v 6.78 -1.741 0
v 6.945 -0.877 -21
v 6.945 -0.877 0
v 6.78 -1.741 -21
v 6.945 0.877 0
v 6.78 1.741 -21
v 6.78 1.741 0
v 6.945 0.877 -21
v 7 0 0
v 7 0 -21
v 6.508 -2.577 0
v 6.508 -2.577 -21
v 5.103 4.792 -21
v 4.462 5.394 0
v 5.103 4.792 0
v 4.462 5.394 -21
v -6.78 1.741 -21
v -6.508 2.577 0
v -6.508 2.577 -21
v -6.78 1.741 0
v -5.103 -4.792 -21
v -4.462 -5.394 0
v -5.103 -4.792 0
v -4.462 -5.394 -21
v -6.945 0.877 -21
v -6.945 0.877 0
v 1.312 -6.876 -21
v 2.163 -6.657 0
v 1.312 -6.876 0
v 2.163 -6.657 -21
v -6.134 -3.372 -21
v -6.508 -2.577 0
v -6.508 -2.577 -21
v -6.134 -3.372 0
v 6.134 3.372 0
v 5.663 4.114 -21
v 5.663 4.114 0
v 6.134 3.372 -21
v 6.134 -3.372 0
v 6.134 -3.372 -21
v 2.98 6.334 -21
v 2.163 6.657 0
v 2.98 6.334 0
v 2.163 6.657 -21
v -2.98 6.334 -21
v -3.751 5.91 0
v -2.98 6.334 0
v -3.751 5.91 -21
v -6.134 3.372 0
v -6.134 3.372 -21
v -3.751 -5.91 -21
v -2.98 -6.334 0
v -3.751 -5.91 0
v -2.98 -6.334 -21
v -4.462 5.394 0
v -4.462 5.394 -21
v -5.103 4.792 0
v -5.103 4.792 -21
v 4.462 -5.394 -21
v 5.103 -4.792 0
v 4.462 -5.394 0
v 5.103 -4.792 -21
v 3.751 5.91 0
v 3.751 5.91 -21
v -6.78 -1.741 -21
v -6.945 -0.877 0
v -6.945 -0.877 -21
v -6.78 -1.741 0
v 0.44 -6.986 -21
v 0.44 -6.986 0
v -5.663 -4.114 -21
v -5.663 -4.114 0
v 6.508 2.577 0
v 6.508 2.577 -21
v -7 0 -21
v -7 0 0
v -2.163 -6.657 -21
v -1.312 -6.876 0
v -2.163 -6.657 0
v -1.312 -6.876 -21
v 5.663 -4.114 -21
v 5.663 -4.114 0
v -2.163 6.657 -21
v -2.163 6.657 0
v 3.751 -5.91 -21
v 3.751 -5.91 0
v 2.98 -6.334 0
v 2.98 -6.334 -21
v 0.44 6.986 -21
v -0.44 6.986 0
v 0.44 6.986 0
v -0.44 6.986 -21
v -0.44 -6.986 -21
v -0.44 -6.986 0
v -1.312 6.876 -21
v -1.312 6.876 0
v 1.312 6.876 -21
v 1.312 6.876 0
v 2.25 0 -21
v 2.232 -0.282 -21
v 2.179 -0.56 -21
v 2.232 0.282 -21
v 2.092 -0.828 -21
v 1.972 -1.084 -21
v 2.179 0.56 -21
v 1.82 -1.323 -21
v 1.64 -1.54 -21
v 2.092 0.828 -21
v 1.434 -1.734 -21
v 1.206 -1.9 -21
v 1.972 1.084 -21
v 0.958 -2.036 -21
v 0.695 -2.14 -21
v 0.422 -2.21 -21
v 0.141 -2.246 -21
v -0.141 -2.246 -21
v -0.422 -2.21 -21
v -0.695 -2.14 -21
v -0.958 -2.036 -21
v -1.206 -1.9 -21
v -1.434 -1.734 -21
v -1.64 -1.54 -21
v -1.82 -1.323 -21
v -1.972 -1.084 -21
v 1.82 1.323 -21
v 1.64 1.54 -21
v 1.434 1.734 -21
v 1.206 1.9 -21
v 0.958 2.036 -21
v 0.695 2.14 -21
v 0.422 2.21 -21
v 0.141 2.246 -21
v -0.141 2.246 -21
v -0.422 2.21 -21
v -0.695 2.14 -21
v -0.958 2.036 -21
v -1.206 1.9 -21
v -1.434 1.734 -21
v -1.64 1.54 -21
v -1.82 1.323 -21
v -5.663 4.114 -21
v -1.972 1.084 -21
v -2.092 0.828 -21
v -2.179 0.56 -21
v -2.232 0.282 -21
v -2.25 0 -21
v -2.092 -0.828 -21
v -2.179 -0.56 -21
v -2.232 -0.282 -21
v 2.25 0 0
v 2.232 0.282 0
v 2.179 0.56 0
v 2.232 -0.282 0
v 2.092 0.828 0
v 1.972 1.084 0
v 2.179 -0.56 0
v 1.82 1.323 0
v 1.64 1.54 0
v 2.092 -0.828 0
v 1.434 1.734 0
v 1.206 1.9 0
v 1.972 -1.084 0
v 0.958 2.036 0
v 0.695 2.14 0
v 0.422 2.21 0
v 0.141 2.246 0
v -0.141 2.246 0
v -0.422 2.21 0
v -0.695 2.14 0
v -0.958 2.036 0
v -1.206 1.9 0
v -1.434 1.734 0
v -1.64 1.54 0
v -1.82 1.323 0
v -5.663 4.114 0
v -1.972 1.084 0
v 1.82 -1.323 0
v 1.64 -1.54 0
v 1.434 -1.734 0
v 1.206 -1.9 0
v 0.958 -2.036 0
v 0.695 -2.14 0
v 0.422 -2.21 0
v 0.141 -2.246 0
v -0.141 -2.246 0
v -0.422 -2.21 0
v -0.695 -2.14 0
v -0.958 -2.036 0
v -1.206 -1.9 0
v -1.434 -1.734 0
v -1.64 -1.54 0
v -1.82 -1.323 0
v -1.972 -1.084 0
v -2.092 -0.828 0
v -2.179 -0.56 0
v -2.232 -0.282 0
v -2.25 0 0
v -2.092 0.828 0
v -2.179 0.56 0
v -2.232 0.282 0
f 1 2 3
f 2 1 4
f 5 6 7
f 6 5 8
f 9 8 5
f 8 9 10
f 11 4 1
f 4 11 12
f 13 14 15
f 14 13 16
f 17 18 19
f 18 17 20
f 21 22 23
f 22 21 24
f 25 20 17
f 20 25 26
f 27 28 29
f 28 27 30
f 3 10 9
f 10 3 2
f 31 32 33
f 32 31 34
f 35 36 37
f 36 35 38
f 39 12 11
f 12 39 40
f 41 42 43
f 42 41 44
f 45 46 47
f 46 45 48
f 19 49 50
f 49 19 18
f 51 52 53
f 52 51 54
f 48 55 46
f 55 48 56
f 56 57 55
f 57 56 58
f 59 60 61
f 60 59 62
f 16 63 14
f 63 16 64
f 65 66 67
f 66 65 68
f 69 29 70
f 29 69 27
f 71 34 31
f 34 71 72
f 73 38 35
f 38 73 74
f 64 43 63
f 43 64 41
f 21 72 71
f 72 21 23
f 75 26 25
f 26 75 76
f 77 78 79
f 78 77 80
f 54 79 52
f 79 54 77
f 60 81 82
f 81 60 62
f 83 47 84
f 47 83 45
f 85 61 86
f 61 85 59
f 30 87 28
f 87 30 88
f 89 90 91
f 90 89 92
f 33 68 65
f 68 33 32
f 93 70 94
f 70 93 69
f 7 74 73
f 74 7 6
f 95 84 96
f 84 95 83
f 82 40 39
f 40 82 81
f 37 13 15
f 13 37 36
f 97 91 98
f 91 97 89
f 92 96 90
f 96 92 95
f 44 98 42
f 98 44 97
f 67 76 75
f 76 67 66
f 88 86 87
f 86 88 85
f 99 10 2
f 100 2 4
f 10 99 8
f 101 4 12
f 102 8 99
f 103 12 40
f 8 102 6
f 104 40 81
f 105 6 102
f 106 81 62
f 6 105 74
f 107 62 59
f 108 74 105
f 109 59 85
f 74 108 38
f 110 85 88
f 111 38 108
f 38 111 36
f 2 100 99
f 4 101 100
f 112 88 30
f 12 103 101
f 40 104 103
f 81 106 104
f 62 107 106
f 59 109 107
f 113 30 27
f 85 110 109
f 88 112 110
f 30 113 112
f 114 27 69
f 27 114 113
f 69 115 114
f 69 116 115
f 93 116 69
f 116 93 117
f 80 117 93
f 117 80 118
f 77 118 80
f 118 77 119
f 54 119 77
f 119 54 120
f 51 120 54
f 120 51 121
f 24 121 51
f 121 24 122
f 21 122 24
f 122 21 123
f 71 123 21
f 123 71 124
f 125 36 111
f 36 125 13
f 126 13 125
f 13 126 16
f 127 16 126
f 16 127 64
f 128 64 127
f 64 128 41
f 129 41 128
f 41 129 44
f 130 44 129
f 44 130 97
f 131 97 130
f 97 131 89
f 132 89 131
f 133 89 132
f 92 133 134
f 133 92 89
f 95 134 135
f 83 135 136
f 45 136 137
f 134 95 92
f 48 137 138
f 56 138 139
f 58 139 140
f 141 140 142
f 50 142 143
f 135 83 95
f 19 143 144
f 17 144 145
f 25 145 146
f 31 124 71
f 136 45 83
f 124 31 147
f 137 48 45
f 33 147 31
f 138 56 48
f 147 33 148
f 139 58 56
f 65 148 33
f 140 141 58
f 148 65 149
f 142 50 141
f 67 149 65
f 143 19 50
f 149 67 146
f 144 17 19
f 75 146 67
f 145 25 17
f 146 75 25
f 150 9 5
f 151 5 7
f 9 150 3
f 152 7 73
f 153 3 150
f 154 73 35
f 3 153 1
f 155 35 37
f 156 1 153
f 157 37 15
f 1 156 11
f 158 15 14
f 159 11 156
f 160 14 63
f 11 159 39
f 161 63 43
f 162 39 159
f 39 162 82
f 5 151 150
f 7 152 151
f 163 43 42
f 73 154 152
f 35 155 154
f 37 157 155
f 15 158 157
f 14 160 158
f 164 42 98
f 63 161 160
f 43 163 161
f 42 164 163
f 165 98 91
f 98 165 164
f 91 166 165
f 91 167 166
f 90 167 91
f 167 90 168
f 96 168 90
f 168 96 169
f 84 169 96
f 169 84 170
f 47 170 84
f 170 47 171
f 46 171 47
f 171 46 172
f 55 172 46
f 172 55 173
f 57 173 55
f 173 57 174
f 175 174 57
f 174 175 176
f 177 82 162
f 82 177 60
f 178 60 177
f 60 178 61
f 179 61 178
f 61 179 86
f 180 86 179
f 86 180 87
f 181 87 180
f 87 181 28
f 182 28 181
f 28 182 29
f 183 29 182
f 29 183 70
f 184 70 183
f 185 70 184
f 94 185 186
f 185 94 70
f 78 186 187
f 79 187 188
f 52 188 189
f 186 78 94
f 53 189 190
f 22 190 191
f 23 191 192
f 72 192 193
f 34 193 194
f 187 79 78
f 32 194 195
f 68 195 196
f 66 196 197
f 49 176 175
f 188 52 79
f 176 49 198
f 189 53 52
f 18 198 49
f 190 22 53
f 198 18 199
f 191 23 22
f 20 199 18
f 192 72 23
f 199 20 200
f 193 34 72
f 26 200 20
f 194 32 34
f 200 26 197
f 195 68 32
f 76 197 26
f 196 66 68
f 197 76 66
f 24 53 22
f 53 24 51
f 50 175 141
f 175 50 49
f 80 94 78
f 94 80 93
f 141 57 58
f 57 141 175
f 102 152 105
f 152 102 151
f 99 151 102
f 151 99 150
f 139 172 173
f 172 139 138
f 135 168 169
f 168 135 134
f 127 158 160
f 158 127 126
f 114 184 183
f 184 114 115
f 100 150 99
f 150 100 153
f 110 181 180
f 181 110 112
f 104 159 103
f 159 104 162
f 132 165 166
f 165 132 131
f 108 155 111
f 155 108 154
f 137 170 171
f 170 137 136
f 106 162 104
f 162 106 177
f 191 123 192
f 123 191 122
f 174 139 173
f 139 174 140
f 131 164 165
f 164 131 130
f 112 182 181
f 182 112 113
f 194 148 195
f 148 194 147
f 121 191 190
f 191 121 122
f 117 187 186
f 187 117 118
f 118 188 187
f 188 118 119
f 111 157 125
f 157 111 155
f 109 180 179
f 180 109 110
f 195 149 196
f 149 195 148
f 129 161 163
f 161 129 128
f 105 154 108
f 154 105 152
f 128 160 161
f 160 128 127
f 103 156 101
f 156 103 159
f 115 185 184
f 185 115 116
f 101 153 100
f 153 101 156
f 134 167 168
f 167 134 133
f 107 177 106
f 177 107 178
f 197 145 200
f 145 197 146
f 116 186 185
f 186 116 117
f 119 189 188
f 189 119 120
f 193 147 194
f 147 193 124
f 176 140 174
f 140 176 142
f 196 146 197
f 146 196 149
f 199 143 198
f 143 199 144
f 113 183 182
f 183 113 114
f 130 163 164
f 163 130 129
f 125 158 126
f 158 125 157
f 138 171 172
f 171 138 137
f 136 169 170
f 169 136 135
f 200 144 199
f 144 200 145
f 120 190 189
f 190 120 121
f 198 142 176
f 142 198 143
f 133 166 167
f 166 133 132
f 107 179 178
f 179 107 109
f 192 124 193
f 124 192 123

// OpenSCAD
$fn = 50;


difference() {
	union() {
		translate(v = [0, 0, -21.0000000000]) {
			cylinder(h = 21, r = 7.0000000000);
		}
	}
	union() {
		#translate(v = [0, 0, -21]) {
			cylinder(h = 21, r = 2.2500000000);
		}
	}
}
